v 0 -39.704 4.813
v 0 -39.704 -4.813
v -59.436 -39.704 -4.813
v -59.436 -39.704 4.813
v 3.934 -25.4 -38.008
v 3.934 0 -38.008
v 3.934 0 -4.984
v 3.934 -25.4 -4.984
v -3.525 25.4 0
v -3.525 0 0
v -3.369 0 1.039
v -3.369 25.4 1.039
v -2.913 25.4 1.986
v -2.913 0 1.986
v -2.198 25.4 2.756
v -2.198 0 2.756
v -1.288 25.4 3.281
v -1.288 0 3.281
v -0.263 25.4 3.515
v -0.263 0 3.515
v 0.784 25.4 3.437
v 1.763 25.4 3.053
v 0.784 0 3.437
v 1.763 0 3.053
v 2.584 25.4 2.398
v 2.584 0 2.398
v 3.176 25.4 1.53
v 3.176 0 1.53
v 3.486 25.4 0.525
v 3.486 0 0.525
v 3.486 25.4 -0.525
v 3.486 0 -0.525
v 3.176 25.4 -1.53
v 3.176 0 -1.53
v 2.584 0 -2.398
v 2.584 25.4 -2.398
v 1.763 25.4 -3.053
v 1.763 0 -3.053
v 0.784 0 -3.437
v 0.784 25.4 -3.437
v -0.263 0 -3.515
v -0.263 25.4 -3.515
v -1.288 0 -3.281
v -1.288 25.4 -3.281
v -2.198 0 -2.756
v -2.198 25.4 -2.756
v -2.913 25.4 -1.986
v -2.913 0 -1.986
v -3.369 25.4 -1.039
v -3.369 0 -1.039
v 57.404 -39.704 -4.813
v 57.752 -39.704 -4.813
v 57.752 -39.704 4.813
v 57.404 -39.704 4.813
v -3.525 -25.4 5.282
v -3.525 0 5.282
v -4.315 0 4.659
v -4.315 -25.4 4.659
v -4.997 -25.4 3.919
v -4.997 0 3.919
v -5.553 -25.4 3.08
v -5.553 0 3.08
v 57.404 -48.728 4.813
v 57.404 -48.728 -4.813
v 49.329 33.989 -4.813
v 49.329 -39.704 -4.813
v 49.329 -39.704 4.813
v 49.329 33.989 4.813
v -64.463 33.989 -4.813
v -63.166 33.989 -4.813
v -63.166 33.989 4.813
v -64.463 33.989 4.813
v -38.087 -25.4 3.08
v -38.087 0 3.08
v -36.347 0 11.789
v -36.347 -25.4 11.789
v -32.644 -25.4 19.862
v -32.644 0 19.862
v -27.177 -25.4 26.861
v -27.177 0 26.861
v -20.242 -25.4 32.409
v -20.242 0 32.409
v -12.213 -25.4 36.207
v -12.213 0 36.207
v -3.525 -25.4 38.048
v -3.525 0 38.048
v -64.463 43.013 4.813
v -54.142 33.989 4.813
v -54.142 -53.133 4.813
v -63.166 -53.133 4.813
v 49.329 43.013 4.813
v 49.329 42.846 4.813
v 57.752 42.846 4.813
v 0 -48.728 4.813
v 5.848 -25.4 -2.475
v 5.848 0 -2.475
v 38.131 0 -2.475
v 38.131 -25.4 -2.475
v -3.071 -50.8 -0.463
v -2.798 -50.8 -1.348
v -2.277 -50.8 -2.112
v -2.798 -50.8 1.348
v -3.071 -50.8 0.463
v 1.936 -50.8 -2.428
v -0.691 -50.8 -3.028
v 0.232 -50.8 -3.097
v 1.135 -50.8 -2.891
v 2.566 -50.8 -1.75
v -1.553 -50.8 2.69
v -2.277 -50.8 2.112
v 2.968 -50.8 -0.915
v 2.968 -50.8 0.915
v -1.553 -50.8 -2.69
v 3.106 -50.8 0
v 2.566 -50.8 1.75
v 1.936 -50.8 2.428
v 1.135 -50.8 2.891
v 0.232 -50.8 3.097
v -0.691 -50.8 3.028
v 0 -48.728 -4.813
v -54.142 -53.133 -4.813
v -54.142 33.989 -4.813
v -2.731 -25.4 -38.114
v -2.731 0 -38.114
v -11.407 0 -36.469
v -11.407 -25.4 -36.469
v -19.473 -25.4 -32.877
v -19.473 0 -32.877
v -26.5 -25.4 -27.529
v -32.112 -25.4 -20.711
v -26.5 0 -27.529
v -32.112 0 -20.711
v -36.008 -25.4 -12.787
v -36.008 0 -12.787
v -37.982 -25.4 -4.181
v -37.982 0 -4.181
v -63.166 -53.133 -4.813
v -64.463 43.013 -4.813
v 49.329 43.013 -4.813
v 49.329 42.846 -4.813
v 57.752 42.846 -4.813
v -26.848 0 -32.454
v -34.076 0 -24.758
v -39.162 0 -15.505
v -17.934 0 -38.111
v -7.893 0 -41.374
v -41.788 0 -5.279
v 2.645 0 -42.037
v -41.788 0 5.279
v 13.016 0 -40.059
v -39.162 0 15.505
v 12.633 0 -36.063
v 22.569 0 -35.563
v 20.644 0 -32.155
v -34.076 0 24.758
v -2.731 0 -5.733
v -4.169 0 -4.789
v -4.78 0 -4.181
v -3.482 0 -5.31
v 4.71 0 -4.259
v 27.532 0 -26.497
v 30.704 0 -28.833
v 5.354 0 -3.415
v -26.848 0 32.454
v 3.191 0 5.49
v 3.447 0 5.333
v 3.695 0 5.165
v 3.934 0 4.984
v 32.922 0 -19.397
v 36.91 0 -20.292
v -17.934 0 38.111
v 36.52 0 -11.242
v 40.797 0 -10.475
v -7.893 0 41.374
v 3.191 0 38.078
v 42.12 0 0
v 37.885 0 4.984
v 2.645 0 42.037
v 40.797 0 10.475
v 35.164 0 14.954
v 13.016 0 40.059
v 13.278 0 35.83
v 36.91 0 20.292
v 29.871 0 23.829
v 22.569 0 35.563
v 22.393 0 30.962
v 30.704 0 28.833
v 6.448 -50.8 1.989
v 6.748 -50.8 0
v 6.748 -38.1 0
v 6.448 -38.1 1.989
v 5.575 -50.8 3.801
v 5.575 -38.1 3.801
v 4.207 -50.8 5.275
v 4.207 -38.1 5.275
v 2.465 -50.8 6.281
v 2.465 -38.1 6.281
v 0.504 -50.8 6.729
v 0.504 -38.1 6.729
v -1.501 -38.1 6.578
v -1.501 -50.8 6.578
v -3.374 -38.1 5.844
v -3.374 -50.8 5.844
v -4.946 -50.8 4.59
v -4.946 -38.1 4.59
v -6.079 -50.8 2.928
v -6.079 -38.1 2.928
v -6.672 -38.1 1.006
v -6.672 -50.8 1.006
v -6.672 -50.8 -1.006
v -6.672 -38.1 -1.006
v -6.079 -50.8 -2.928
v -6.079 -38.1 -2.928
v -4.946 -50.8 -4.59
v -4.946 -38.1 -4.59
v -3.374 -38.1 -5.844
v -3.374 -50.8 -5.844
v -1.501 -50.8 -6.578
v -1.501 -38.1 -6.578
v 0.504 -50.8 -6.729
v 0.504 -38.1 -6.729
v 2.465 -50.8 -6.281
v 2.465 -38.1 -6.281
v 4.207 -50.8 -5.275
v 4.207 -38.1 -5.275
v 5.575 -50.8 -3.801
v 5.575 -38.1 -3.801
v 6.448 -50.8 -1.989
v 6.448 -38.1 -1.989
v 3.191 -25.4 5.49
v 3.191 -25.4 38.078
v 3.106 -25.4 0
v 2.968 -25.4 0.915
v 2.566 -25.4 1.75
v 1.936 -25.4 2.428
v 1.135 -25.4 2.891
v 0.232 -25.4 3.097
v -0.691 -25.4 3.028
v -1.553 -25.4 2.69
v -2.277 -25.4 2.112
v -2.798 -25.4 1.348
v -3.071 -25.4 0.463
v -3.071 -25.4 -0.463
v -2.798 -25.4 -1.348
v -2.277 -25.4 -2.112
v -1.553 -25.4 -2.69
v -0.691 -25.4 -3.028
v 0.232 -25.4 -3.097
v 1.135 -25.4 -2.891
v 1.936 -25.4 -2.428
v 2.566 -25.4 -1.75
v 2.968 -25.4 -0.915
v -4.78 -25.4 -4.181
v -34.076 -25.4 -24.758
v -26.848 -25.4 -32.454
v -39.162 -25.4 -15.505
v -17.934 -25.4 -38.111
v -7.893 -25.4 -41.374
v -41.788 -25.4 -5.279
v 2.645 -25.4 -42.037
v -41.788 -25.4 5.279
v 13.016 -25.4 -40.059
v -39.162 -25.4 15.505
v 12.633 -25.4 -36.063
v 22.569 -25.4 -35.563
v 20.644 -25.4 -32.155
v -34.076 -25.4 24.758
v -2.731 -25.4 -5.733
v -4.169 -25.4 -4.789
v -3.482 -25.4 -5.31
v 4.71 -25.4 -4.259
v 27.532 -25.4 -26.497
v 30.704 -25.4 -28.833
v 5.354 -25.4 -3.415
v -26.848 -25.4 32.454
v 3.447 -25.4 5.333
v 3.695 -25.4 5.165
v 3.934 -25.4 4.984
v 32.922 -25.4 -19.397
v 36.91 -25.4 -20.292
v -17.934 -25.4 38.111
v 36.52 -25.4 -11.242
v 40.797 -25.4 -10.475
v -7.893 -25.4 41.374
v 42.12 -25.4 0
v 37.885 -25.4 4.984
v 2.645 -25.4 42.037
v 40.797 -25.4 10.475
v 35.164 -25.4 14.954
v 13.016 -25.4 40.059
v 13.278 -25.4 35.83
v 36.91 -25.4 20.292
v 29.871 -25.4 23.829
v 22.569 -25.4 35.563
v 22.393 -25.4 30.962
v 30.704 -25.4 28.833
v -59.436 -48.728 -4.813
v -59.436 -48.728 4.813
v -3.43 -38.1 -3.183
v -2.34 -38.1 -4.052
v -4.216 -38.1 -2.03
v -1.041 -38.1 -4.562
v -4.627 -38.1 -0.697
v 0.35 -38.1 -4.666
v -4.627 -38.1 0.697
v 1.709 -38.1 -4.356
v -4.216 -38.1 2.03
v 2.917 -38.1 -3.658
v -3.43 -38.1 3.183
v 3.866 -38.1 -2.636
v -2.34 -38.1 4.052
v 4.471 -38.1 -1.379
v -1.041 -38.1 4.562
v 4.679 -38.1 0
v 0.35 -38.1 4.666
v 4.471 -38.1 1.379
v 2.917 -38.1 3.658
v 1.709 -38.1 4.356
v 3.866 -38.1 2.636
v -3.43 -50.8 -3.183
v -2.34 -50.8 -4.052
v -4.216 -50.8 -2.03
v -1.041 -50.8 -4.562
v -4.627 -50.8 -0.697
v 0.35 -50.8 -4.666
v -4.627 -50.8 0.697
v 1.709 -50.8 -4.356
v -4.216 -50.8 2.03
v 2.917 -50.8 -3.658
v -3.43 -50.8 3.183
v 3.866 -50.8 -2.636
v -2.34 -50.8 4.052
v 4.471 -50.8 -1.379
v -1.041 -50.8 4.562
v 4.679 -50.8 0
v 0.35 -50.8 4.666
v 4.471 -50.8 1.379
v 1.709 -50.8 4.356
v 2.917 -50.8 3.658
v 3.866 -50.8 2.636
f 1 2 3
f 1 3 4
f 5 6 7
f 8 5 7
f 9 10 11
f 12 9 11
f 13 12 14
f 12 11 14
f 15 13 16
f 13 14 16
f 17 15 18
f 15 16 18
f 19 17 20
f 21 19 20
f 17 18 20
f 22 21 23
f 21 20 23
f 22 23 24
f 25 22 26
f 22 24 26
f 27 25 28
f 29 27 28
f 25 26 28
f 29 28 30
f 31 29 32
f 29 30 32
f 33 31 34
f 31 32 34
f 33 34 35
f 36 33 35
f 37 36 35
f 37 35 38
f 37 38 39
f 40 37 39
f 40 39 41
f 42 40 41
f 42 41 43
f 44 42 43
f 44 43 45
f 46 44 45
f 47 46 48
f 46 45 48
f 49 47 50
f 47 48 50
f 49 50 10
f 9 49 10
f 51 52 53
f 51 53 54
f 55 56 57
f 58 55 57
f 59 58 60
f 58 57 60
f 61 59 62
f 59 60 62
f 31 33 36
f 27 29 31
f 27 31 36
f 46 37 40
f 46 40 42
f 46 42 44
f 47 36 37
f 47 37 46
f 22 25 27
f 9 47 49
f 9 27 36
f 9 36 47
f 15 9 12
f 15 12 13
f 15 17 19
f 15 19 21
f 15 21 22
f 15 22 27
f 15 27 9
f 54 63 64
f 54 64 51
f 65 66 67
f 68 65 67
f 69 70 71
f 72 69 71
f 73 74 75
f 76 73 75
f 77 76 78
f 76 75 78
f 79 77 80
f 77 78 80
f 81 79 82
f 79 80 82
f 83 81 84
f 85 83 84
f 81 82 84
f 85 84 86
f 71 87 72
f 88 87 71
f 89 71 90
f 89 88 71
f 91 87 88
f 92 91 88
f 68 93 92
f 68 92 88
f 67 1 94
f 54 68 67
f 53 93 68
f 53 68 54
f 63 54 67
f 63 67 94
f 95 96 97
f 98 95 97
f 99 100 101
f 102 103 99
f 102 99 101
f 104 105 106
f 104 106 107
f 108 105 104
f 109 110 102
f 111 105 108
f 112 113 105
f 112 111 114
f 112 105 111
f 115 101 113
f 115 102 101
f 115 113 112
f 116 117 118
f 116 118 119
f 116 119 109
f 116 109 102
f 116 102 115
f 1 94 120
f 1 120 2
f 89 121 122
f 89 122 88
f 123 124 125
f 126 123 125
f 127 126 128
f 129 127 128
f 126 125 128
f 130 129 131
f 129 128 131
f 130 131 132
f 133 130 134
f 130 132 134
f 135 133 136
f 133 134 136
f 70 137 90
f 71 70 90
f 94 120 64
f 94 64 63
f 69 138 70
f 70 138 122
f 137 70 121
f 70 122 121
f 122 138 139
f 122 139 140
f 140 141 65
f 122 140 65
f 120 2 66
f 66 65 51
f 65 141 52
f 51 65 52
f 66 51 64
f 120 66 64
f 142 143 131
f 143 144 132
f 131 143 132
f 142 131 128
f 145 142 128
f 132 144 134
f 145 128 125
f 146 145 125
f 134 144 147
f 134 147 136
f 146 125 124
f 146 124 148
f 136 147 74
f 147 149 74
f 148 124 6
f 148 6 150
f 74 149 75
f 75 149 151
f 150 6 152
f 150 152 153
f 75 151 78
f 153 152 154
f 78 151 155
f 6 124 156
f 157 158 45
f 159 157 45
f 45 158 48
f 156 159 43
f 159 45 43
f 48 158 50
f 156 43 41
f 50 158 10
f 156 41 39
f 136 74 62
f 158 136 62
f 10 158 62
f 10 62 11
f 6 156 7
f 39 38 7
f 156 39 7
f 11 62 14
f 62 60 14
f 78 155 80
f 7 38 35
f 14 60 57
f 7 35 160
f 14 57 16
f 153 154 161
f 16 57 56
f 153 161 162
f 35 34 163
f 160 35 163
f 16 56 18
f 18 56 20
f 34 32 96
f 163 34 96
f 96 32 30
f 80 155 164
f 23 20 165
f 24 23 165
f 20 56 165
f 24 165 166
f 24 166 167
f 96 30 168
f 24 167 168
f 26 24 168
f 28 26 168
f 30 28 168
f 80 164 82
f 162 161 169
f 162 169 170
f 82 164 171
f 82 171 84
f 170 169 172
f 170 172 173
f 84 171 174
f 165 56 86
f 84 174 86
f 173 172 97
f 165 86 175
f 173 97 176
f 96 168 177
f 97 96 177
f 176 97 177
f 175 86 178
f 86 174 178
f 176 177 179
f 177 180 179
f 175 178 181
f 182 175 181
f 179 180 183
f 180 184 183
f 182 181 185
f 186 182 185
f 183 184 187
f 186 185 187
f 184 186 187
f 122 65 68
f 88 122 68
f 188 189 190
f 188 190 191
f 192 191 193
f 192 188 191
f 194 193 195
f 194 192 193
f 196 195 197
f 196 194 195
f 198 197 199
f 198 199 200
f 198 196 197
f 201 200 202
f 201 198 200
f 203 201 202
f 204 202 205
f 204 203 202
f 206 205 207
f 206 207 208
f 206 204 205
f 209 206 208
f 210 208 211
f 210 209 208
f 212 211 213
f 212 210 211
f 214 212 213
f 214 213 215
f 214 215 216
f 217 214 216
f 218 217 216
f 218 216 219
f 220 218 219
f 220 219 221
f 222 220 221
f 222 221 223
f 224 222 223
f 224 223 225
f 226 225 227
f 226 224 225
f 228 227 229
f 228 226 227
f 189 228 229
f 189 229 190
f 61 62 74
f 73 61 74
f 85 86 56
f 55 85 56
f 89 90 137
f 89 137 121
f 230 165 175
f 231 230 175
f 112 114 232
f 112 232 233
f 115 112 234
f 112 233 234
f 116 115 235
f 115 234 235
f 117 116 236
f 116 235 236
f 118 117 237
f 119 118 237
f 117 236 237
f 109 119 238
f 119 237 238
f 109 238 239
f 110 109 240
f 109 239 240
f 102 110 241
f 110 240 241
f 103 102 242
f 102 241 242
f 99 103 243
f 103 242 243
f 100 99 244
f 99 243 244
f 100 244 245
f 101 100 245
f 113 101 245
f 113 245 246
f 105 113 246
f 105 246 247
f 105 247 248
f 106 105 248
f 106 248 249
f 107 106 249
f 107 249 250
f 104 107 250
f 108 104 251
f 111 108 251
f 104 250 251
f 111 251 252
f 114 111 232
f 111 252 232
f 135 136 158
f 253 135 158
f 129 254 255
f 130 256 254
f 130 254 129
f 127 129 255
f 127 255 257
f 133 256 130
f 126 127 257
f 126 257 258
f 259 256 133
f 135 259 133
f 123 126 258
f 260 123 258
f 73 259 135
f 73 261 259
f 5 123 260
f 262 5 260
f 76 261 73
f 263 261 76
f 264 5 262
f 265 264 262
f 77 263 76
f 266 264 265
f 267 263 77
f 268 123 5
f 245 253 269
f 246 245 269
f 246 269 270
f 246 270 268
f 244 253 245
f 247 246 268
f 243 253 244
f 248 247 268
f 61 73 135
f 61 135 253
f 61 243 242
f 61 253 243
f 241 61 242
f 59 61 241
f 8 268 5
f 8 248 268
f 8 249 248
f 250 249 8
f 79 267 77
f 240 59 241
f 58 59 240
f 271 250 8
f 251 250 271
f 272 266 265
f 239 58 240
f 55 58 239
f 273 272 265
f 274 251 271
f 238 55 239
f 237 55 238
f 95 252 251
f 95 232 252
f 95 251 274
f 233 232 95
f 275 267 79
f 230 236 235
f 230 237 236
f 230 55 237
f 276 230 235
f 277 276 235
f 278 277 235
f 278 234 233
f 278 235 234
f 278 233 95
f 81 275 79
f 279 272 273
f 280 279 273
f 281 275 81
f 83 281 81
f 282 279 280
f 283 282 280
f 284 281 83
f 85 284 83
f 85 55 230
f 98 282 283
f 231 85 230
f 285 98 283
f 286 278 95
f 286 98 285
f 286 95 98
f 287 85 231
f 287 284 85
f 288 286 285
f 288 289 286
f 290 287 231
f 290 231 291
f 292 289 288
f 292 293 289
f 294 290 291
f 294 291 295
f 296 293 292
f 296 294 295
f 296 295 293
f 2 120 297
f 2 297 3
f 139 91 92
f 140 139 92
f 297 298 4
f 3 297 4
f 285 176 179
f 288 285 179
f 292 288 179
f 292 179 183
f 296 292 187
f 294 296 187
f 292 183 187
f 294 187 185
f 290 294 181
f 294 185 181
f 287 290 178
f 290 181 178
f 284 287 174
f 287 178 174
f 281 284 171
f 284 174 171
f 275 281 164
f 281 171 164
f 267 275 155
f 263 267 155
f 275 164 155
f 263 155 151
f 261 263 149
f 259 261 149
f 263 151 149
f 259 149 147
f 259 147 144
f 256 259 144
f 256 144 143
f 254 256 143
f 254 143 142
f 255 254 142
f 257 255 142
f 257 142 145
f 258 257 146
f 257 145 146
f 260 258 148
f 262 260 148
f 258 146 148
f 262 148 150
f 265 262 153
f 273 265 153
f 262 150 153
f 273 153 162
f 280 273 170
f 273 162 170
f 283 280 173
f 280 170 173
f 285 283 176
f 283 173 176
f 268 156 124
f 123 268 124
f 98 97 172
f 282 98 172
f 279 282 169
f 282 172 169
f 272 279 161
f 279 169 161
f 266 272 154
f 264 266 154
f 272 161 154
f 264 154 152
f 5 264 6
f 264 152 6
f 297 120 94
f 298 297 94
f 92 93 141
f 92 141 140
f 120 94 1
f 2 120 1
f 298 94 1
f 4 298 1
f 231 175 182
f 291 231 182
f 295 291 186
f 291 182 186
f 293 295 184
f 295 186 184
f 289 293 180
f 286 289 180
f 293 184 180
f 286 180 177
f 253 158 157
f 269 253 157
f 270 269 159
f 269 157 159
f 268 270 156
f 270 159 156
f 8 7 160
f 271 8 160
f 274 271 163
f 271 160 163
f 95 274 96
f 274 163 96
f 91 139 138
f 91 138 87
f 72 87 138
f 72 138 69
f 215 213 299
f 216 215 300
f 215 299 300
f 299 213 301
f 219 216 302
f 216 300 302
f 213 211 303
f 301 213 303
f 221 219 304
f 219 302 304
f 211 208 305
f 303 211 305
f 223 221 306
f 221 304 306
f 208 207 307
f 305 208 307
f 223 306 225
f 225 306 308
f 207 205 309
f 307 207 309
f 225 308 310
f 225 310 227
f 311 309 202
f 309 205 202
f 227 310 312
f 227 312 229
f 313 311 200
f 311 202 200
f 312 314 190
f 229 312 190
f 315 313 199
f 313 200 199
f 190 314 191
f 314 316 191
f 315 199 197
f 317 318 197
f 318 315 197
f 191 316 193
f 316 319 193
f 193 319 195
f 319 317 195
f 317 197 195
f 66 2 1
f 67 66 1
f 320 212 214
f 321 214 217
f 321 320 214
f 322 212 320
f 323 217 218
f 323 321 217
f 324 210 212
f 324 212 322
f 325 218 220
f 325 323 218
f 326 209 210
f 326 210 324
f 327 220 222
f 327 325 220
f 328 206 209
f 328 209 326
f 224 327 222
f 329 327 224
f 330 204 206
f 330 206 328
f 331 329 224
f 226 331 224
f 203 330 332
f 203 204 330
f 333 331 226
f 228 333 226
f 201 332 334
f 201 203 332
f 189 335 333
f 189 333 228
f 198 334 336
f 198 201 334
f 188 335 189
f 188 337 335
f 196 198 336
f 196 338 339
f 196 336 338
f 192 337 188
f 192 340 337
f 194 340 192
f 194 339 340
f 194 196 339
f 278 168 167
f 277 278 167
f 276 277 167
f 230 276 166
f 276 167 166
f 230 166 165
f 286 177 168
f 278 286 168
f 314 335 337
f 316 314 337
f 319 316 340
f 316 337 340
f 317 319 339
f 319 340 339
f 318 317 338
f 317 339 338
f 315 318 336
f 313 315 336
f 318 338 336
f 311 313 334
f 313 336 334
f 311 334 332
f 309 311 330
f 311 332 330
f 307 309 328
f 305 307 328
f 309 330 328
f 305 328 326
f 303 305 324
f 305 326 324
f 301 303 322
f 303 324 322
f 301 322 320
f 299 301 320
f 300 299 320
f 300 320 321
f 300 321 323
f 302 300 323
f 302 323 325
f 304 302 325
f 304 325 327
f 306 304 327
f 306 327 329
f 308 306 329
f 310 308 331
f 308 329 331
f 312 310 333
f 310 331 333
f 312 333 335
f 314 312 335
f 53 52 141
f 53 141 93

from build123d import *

# Parameters (mm, degrees)
F0_R      = 42.120196
F1_DEPTH  = 25.4
F2_R      = 3.1057
F3_DEPTH  = 25.4
F4_R      = 3.525141
F5_DEPTH  = 25.4
F6_R      = 6.747617
F6_R_2    = 4.679187
F7_DEPTH  = 12.7
F8_W      = 9.023681
F8_H      = 9.625264
F9_DEPTH  = 57.404
F10_W     = 8.422106
F10_H     = 9.625264
F11_DEPTH = 82.55
F12_W     = 9.023688
F12_H     = 9.625264
F13_DEPTH = 113.792
F14_W     = 9.023682
F14_H     = 9.625264
F15_DEPTH = 87.122
F16_DEPTH = 59.436


with BuildPart() as f1:
    # F0 (on Front) → F1 (new body)
    with BuildSketch(Plane.XZ):
        Circle(F0_R)
        with BuildLine():
            Line((-37.982044, -4.180653), (-4.779607, -4.180653))
            ThreePointArc((-4.779607, -4.180653), (-3.834717, -5.061368), (-2.731153, -5.732653))
            Line((-2.731153, -5.732653), (-2.731153, -38.113703))
            ThreePointArc((-2.731153, -38.113703), (-26.500077, -27.529248), (-37.982044, -4.180653))
        make_face(mode=Mode.SUBTRACT)
        with BuildLine():
            Line((3.934123, -38.008371), (3.934123, -4.984494))
            ThreePointArc((3.934123, -4.984494), (5.049451, -3.850395), (5.847939, -2.474694))
            Line((5.847939, -2.474694), (38.131214, -2.474694))
            ThreePointArc((38.131214, -2.474694), (27.532411, -26.49679), (3.934123, -38.008371))
        make_face(mode=Mode.SUBTRACT)
        with BuildLine():
            ThreePointArc((-38.087083, 3.080209), (-27.177, 26.861203), (-3.525141, 38.048481))
            Line((-3.525141, 38.048481), (-3.525141, 5.281655))
            ThreePointArc((-3.525141, 5.281655), (-4.670583, 4.302111), (-5.552911, 3.080209))
            Line((-5.552911, 3.080209), (-38.087083, 3.080209))
        make_face(mode=Mode.SUBTRACT)
        with BuildLine():
            Line((37.884936, 4.984494), (3.934123, 4.984494))
            ThreePointArc((3.934123, 4.984494), (3.571703, 5.25028), (3.191392, 5.489765))
            Line((3.191392, 5.489765), (3.191392, 38.077928))
            ThreePointArc((3.191392, 38.077928), (26.37442, 27.649657), (37.884936, 4.984494))
        make_face(mode=Mode.SUBTRACT)
    extrude(amount=F1_DEPTH)

    # F2 (on face) → F3 (join)
    with BuildSketch(Plane.XZ.offset(25.4)):
        Circle(F2_R)
    extrude(amount=F3_DEPTH)

    # F4 (on face) → F5 (join)
    with BuildSketch(Plane(origin=(0, 0, 0), x_dir=(-1, 0, 0), z_dir=(0, 1, 0))):
        Circle(F4_R)
    extrude(amount=F5_DEPTH)


with BuildPart() as f7:
    # F6 (on face) → F7 (new body)
    with BuildSketch(Plane.XZ.offset(50.8)):
        Circle(F6_R)
        Circle(F6_R_2, mode=Mode.SUBTRACT)
    extrude(amount=-F7_DEPTH)


with BuildPart() as f9:
    # F8 (on Right) → F9 (new body)
    with BuildSketch(Plane.YZ):
        with Locations((-44.216051, 0)):
            Rectangle(F8_W, F8_H)
    extrude(amount=F9_DEPTH)

    # F10 (on face) → F11 (join)
    with BuildSketch(Plane(origin=(0, -39.704211, 0), x_dir=(-1, 0, 0), z_dir=(0, 1, 0))):
        with Locations((-53.540528, 0)):
            Rectangle(F10_W, F10_H)
    extrude(amount=F11_DEPTH)

    # F12 (on face) → F13 (join)
    with BuildSketch(Plane(origin=(49.329475, 0, 0), x_dir=(0, -1, 0), z_dir=(-1, 0, 0))):
        with Locations((-38.501054, 0)):
            Rectangle(F12_W, F12_H)
    extrude(amount=F13_DEPTH)

    # F14 (on face) → F15 (join)
    with BuildSketch(Plane.XZ.offset(-33.98921)):
        with Locations((-58.653947, 0)):
            Rectangle(F14_W, F14_H)
    extrude(amount=F15_DEPTH)


with BuildPart() as f16:
    # F8 (on Right) → F16 (new body)
    with BuildSketch(Plane.YZ):
        with Locations((-44.216051, 0)):
            Rectangle(F8_W, F8_H)
    extrude(amount=-F16_DEPTH)


solid = Compound([f1.part, f7.part, f9.part, f16.part])
